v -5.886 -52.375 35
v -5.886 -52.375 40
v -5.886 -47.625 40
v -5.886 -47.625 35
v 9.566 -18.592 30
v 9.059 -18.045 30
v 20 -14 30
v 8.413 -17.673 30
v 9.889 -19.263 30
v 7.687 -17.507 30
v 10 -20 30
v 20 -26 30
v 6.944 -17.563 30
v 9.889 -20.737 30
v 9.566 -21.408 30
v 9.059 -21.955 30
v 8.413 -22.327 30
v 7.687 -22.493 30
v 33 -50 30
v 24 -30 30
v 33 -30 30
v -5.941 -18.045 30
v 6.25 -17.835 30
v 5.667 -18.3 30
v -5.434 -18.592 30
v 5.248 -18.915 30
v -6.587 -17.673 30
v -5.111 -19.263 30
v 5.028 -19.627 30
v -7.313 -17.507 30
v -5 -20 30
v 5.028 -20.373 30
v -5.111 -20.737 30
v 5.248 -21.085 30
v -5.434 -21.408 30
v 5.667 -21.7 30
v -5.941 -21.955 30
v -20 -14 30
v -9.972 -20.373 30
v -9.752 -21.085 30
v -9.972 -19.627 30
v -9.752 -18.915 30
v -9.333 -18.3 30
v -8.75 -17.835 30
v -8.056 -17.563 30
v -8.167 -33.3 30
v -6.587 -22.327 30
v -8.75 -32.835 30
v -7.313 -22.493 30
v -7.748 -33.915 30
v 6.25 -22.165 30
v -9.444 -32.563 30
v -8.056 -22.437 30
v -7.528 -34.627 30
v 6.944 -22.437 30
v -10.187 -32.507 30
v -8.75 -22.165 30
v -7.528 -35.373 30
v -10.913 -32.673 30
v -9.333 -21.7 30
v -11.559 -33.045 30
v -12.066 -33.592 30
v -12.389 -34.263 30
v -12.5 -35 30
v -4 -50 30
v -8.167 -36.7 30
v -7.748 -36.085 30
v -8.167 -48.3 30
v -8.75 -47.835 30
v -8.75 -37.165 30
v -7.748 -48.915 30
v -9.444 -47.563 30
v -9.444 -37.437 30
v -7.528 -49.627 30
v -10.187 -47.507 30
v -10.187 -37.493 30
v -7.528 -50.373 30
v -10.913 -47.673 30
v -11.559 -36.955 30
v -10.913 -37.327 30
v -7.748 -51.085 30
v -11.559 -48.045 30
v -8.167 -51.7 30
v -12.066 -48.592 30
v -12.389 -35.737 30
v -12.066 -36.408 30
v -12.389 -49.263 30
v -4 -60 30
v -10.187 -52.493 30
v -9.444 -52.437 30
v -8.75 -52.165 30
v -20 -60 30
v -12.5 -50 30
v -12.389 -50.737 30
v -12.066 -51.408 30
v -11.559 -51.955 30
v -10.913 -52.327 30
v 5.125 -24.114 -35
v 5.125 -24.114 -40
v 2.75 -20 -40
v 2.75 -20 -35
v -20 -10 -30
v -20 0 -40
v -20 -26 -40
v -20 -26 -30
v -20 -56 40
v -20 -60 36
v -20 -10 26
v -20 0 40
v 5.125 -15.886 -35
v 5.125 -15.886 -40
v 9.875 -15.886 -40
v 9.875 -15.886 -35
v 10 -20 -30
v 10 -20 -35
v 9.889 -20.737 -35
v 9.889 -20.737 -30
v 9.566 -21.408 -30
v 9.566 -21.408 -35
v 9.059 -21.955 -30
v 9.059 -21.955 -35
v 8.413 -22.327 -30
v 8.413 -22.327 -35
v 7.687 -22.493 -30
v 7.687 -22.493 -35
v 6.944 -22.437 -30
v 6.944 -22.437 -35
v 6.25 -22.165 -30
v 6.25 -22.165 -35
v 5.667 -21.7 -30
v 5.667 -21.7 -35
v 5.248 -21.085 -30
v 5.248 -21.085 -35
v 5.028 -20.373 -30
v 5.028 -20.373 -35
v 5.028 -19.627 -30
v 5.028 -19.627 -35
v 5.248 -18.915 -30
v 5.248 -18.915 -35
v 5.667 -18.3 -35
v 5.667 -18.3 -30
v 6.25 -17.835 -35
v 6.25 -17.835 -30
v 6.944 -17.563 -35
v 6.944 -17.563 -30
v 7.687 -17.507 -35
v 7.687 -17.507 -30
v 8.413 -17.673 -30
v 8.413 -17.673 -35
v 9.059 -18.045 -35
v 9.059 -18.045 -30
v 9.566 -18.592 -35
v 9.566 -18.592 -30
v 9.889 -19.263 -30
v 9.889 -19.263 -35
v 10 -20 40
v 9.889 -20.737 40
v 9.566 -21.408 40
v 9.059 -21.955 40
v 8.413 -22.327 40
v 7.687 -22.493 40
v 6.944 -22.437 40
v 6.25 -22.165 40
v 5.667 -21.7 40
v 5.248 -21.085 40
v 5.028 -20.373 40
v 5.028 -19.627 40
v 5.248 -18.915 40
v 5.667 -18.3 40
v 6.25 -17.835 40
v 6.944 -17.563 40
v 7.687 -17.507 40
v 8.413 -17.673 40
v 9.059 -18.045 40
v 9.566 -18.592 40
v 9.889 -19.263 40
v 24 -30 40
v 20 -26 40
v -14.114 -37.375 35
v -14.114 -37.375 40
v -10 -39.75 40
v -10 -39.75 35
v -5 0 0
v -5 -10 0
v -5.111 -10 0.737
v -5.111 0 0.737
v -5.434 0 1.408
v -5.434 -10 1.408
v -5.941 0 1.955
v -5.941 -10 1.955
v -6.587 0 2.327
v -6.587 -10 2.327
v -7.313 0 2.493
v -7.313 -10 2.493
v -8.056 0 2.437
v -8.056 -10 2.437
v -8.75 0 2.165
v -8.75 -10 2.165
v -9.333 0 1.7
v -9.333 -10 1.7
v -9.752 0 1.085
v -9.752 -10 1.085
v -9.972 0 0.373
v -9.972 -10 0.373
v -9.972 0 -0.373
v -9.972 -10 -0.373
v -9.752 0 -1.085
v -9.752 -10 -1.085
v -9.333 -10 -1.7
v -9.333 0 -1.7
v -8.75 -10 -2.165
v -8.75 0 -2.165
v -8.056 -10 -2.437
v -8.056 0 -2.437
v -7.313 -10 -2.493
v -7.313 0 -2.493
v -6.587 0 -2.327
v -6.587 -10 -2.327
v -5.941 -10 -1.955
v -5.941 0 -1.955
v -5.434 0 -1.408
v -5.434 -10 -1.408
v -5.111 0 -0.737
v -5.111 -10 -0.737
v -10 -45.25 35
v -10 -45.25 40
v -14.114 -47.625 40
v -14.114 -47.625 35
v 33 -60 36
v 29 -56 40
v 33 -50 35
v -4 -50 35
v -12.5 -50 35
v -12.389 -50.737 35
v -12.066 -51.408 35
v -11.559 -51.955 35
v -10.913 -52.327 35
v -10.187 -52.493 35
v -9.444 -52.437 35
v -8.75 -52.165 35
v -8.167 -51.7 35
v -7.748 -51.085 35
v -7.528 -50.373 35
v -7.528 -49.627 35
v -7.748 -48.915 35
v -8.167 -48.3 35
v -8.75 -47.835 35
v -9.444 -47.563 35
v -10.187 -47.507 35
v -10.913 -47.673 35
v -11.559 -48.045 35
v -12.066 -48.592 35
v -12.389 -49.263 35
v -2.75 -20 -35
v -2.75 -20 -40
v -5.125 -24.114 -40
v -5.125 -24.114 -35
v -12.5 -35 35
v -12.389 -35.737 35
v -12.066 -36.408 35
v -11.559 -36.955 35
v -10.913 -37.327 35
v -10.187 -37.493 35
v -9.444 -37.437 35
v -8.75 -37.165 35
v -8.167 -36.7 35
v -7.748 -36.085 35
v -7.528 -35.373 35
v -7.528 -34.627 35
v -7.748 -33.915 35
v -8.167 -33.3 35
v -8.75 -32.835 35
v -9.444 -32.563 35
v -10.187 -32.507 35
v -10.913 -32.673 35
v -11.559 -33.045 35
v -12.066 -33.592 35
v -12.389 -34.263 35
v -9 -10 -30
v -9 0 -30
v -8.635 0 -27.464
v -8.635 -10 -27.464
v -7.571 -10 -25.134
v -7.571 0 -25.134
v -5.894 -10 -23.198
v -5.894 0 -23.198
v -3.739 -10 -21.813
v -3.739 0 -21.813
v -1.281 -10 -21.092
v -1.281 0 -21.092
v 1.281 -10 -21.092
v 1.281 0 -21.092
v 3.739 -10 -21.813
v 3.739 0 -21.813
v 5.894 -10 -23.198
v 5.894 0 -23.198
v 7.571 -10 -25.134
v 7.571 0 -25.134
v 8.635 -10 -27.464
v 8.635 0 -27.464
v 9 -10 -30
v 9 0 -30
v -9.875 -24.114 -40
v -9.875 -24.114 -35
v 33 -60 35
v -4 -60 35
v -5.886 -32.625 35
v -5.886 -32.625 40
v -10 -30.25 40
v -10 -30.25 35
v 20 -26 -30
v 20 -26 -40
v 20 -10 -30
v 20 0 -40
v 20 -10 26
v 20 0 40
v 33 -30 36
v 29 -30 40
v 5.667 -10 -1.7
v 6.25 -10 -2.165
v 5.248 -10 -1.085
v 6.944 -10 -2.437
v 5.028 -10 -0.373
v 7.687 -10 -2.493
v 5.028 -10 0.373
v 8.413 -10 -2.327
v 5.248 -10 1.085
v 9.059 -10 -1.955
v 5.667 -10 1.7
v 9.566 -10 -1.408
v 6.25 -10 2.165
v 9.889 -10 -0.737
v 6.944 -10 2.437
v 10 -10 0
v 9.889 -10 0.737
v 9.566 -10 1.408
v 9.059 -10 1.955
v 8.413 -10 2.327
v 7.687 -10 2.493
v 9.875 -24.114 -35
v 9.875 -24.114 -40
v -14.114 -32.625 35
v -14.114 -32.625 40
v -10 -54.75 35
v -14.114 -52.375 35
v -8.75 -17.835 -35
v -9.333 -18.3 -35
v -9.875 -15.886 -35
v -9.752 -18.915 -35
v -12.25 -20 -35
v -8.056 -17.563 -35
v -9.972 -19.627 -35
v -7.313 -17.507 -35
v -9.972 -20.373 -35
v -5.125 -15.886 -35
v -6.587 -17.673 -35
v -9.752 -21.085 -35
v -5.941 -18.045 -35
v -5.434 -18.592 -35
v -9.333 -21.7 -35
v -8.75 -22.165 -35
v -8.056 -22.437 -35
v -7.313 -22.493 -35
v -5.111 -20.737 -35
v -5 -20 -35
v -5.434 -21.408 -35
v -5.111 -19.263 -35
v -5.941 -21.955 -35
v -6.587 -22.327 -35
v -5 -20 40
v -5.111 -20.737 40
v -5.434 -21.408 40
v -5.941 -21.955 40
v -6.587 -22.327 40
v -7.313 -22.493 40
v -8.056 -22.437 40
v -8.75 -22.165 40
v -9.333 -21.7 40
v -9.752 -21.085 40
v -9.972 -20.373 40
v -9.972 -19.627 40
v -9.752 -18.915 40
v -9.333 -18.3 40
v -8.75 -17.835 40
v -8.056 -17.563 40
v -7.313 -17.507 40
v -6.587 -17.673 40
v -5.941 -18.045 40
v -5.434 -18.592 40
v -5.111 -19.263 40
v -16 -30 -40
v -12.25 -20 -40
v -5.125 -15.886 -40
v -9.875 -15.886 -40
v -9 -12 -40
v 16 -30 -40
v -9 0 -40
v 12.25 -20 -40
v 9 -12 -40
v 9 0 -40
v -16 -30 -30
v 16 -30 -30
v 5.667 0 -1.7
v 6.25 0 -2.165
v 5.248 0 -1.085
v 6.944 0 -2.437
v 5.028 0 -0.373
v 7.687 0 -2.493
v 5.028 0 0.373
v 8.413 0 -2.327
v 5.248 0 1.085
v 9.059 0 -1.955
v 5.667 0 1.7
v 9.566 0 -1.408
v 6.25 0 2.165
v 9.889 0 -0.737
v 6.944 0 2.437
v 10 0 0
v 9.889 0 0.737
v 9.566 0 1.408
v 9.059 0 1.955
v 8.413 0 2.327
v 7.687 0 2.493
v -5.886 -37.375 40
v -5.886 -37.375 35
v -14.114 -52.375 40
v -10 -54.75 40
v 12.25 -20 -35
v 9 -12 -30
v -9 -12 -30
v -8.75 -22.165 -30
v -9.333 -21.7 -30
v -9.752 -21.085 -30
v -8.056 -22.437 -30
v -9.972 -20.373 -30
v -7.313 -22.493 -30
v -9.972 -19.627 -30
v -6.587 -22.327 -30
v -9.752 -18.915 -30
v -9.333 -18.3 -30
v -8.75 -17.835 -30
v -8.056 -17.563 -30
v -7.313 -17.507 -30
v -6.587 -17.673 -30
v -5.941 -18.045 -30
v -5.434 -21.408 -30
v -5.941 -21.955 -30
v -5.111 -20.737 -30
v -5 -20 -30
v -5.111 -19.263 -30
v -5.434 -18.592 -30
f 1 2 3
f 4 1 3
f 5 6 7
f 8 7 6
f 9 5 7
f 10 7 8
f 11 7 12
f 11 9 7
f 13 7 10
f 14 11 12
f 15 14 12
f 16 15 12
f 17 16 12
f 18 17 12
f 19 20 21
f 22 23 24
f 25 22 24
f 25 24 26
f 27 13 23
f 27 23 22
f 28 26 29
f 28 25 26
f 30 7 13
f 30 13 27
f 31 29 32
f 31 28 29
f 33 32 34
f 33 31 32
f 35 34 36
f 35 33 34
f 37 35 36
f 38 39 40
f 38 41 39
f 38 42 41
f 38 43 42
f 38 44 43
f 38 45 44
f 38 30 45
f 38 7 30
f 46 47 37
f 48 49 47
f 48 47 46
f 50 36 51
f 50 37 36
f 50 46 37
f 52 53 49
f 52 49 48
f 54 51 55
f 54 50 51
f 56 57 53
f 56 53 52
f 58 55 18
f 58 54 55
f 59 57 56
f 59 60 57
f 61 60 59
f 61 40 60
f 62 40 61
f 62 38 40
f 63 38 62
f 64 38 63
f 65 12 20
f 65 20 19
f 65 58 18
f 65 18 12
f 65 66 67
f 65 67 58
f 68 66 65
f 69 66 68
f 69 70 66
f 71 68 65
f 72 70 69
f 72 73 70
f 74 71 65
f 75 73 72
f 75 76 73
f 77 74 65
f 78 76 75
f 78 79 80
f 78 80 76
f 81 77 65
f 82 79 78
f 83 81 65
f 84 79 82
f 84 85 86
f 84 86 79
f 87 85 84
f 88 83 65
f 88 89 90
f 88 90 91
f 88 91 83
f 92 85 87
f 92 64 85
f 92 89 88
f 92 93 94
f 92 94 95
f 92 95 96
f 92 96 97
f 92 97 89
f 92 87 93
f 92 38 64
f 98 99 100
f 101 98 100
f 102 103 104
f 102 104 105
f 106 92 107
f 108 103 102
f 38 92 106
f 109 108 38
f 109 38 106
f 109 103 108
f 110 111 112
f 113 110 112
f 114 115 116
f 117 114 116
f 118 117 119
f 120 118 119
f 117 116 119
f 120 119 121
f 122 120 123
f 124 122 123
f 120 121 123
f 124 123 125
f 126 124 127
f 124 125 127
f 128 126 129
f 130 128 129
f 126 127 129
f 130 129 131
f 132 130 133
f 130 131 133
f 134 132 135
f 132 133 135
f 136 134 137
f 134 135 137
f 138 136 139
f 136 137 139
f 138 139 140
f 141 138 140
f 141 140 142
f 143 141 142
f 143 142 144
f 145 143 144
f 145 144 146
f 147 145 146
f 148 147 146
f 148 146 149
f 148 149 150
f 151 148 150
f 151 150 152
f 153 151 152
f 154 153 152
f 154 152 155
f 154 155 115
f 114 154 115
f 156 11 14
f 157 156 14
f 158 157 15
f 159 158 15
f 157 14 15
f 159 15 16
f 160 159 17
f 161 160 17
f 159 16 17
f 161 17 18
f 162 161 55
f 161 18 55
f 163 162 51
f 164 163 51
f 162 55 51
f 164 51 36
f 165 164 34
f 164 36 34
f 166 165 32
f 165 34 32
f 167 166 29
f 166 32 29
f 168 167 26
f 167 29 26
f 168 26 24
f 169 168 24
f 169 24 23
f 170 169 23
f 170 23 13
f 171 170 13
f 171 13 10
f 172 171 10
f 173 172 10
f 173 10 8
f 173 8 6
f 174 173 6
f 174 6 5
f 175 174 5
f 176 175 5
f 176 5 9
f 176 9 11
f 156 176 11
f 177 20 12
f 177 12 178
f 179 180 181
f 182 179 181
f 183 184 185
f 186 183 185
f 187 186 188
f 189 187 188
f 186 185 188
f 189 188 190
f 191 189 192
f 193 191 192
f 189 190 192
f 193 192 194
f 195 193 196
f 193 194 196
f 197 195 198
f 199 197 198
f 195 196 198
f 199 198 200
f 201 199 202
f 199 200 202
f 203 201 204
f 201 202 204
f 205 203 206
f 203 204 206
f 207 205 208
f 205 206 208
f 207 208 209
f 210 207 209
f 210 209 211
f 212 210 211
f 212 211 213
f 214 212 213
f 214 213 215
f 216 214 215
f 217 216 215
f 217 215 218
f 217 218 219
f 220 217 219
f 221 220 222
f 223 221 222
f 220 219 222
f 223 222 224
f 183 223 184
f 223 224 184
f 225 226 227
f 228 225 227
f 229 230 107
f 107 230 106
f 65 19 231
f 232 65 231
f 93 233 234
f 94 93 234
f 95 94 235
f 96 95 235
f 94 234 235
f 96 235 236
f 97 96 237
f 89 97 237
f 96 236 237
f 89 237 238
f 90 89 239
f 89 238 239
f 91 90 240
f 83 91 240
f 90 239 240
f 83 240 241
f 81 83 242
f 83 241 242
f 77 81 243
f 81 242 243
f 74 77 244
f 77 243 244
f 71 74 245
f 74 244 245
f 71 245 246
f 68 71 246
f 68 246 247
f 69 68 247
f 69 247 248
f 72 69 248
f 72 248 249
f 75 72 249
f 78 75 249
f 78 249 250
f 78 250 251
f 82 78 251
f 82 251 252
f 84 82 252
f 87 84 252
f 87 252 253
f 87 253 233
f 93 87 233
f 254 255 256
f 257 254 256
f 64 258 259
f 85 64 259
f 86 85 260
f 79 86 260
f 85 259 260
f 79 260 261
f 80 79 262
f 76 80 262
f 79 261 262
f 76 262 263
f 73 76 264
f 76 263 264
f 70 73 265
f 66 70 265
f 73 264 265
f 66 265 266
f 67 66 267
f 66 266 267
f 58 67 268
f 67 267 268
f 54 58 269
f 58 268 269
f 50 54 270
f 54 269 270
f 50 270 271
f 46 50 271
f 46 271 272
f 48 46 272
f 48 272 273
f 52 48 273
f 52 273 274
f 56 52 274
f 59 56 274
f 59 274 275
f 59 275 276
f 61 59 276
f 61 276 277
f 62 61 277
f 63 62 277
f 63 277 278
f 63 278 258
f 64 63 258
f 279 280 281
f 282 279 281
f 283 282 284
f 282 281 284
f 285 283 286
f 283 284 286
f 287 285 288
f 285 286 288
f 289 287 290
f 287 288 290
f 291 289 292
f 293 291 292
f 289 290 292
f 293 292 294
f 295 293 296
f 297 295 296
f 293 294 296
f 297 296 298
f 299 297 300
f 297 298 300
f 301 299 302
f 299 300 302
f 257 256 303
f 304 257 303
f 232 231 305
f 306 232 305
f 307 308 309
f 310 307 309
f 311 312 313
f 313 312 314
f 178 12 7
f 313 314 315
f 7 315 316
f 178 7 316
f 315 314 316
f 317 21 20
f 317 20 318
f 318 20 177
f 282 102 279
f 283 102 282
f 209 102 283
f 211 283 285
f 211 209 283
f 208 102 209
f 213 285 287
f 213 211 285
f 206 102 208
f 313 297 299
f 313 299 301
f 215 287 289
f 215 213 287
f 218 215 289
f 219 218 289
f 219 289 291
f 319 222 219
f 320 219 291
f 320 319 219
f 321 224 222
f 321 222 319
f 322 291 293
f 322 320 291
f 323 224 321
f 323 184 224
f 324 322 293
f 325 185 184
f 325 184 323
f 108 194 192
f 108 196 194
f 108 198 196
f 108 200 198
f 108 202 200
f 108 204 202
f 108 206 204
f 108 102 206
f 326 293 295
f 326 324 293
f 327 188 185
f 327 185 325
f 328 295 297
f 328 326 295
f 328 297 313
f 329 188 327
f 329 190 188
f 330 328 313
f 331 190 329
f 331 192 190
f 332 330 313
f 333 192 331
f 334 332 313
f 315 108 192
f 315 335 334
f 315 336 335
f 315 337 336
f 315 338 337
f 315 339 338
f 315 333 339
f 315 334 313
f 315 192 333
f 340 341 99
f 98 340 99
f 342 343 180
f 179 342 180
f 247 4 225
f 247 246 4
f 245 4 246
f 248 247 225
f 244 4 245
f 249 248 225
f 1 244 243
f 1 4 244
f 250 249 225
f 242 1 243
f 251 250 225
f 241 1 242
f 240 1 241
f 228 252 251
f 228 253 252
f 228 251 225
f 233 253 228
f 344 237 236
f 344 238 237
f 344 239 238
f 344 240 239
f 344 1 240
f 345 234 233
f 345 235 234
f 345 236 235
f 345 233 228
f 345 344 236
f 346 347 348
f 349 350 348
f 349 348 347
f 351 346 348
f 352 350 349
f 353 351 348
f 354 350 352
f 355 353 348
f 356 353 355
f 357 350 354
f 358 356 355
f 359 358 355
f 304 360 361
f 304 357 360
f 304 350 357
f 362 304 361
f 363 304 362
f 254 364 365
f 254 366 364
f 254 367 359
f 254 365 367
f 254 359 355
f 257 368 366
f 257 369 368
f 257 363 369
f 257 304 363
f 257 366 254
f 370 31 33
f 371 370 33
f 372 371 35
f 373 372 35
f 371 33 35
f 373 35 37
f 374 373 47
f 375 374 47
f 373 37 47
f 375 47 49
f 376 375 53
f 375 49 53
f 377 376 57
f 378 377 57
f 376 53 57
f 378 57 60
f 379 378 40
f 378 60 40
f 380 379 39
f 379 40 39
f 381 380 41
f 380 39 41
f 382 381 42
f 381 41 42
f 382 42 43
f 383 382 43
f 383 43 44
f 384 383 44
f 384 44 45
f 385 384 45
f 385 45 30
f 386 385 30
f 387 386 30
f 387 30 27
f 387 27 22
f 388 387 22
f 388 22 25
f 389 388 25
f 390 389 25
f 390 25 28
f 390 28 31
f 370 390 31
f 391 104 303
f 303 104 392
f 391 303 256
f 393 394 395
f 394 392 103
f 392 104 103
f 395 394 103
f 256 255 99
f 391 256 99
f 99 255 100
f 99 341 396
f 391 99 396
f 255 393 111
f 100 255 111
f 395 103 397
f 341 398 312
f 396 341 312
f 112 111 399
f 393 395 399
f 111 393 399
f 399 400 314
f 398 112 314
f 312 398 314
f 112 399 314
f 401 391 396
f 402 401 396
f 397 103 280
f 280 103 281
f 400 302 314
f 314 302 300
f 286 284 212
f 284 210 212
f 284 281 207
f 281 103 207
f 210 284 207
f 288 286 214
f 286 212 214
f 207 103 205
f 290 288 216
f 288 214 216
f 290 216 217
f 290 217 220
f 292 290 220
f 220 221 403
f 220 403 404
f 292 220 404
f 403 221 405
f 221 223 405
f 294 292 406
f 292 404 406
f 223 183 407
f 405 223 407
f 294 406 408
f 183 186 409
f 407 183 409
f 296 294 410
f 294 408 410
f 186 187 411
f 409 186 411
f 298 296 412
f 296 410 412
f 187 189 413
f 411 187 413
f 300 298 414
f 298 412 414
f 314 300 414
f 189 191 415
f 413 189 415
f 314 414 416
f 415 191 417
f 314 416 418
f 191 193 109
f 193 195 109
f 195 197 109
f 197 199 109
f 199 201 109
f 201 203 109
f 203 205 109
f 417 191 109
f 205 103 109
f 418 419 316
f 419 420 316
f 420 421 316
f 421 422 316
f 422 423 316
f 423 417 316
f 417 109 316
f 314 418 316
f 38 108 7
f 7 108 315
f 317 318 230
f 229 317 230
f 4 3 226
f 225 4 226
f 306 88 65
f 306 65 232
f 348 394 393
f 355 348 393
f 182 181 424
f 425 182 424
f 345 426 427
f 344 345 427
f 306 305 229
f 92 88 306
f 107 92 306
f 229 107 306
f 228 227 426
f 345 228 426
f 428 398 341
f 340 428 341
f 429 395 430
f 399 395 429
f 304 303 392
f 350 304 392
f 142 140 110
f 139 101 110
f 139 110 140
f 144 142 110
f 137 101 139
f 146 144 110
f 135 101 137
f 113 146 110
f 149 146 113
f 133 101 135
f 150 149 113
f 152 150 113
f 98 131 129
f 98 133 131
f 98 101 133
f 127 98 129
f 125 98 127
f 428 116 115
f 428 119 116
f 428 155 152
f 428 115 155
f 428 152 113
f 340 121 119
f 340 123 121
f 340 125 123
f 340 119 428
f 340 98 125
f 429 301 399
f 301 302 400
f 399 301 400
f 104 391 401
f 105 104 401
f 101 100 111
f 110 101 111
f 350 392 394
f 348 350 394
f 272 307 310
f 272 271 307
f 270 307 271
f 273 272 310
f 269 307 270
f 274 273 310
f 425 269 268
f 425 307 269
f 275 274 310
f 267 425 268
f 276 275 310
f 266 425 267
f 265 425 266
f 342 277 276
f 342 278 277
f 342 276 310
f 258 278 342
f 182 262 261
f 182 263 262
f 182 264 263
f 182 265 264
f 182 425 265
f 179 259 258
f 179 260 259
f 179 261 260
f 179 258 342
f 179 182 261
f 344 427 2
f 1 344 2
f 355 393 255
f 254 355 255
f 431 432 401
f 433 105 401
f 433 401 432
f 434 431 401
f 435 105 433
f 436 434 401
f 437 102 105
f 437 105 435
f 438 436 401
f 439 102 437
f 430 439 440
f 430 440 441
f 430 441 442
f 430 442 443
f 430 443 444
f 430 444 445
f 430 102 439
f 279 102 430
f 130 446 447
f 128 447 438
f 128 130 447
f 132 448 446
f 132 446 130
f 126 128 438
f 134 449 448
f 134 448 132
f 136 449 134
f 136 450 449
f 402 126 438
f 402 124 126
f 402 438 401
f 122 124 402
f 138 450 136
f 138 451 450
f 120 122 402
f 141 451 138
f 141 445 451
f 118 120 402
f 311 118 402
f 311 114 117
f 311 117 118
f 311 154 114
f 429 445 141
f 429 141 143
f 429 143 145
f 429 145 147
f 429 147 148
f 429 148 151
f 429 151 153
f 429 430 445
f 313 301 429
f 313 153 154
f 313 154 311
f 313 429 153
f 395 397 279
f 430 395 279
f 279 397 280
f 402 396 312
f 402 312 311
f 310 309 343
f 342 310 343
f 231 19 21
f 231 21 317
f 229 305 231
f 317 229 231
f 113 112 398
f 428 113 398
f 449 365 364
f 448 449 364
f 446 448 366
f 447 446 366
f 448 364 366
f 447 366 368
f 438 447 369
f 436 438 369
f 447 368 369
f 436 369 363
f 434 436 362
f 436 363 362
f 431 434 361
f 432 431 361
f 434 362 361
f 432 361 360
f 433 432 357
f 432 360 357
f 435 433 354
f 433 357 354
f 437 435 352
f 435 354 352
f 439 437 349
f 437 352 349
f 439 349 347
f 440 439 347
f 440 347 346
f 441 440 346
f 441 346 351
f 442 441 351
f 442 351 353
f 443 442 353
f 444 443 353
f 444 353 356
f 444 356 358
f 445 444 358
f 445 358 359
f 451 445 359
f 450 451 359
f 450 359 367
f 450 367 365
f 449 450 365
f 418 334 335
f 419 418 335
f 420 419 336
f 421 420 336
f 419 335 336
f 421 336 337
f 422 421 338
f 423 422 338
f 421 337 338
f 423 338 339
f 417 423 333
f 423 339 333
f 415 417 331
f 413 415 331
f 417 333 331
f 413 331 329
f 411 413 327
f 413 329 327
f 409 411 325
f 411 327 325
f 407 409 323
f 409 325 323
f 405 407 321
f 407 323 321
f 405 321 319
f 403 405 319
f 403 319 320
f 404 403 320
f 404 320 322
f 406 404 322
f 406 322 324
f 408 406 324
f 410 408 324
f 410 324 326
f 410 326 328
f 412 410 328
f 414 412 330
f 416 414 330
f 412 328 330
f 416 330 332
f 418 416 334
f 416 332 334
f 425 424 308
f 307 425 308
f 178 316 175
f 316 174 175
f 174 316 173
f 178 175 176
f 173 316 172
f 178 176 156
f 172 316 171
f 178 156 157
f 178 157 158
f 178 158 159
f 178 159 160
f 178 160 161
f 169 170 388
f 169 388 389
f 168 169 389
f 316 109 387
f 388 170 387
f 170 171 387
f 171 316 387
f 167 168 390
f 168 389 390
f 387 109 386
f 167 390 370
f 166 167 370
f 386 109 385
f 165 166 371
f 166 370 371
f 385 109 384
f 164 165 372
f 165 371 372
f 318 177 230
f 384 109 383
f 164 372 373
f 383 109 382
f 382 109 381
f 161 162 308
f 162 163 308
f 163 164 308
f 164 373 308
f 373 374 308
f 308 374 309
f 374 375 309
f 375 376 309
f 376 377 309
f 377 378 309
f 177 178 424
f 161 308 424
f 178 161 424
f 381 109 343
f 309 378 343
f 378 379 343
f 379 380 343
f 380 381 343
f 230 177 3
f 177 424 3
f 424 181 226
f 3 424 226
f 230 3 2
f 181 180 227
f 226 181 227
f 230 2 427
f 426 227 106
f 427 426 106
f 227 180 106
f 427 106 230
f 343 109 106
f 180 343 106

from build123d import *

# Parameters (mm, degrees)
SKETCH_W        = 40
SKETCH_H        = 80
PAD_DEPTH       = 10
SKETCH001_W     = 40
SKETCH001_H     = 10
PAD001_DEPTH    = 50
SKETCH002_R     = 2.5
POCKET_DEPTH    = 10
SKETCH003_R     = 2.5
POCKET001_DEPTH = 10
POCKET002_DEPTH = 5
SKETCH006_R     = 2.5
POCKET003_DEPTH = 84
SKETCH008_W     = 40
SKETCH008_H     = 30
POCKET005_DEPTH = 10
SKETCH010_W     = 10
SKETCH010_H     = 30
PAD002_DEPTH    = 13
POCKET006_DEPTH = 12
POCKET007_DEPTH = 5
SKETCH013_W     = 5
SKETCH013_H     = 10
POCKET008_DEPTH = 37
CHAMFER_SIZE    = 4


with BuildPart() as part:
    # Sketch → Pad (new body)
    with BuildSketch(Plane.XZ):
        Rectangle(SKETCH_W, SKETCH_H)
    extrude(amount=PAD_DEPTH)

    # Sketch001 (on Face6 of Pad) → Pad001 (join)
    with BuildSketch(Plane.XZ.offset(10)):
        with Locations((0, 35)):
            Rectangle(SKETCH001_W, SKETCH001_H)
        with Locations((0, -35)):
            Rectangle(SKETCH001_W, SKETCH001_H)
    extrude(amount=PAD001_DEPTH)

    # Sketch002 (on Face8 of Pad001) → Pocket (cut)
    with BuildSketch(Plane.XZ.offset(10)):
        with Locations((-7.5, 0)):
            Circle(SKETCH002_R)
        with Locations((7.5, 0)):
            Circle(SKETCH002_R)
    extrude(amount=-POCKET_DEPTH, mode=Mode.SUBTRACT)

    # Sketch003 (on Face5 of Pocket) → Pocket001 (cut)
    with BuildSketch(Plane(origin=(0, 0, 40), x_dir=(-1, 0, 0), z_dir=(0, 0, 1))):
        with Locations((10, 50)):
            Circle(SKETCH003_R)
        with Locations((10, 35)):
            Circle(SKETCH003_R)
    extrude(amount=-POCKET001_DEPTH, mode=Mode.SUBTRACT)

    # Sketch004 (on Face5 of Pocket001) → Pocket002 (cut)
    with BuildSketch(Plane(origin=(0, 0, 40), x_dir=(-1, 0, 0), z_dir=(0, 0, 1))):
        Polygon((14.113621, 47.625), (14.113621, 52.375), (10, 54.75), (5.886379, 52.375), (5.886379, 47.625), (10, 45.25), align=None)
        Polygon((14.113621, 32.625), (14.113621, 37.375), (10, 39.75), (5.886379, 37.375), (5.886379, 32.625), (10, 30.25), align=None)
    extrude(amount=-POCKET002_DEPTH, mode=Mode.SUBTRACT)

    # Sketch006 (on Face27 of Pocket002) → Pocket003 (cut)
    with BuildSketch(Plane(origin=(0, 0, -40), x_dir=(1, 0, 0), z_dir=(0, 0, -1))):
        with Locations((-7.5, 20)):
            Circle(SKETCH006_R)
        with Locations((7.5, 20)):
            Circle(SKETCH006_R)
    extrude(amount=-POCKET003_DEPTH, mode=Mode.SUBTRACT)

    # Sketch008 → Pocket005 (cut)
    with BuildSketch(Plane(origin=(0, 0, -40), x_dir=(1, 0, 0), z_dir=(0, 0, -1))):
        with Locations((0, 45)):
            Rectangle(SKETCH008_W, SKETCH008_H)
    extrude(amount=-POCKET005_DEPTH, mode=Mode.SUBTRACT)

    # Sketch010 → Pad002 (join)
    with BuildSketch(Plane(origin=(20, 0, 0), x_dir=(0, 0, 1), z_dir=(1, 0, 0))):
        with Locations((35, 45)):
            Rectangle(SKETCH010_W, SKETCH010_H)
    extrude(amount=PAD002_DEPTH)

    # Sketch011 → Pocket006 (cut)
    with BuildSketch(Plane(origin=(0, 0, 0), x_dir=(1, 0, 0), z_dir=(0, 1, 0))):
        with BuildLine():
            ThreePointArc((-9, 30), (0, 21), (9, 30))
            Line((9, 30), (9, 50))
            ThreePointArc((9, 50), (0, 59), (-9, 50))
            Line((-9, 50), (-9, 30))
        make_face()
    extrude(amount=-POCKET006_DEPTH, mode=Mode.SUBTRACT)

    # Sketch012 (on Face34 of Pocket006) → Pocket007 (cut)
    with BuildSketch(Plane(origin=(0, 0, -40), x_dir=(1, 0, 0), z_dir=(0, 0, -1))):
        Polygon((-2.75, 20), (-5.125, 24.113621), (-9.875, 24.113621), (-12.25, 20), (-9.875, 15.886379), (-5.125, 15.886379), align=None)
        Polygon((9.875, 15.886379), (12.25, 20), (9.875, 24.113621), (5.125, 24.113621), (2.75, 20), (5.125, 15.886379), align=None)
    extrude(amount=-POCKET007_DEPTH, mode=Mode.SUBTRACT)

    # Sketch013 (on Face41 of Pocket007) → Pocket008 (cut)
    with BuildSketch(Plane(origin=(33, 0, 0), x_dir=(0, 0, 1), z_dir=(1, 0, 0))):
        with Locations((32.5, 55)):
            Rectangle(SKETCH013_W, SKETCH013_H)
    extrude(amount=-POCKET008_DEPTH, mode=Mode.SUBTRACT)

    # Chamfer
    chamfer_edges = [part.edges().sort_by_distance(p)[0] for p in [
        (0, -10, 30),
        (20, -30, 35),
        (0, -60, 40),
        (26.5, -60, 40),
        (33, -45, 40),
        (20, -30, -35),
        (-20, -30, -35),
    ]]
    chamfer(chamfer_edges, length=CHAMFER_SIZE)


solid = part.part
